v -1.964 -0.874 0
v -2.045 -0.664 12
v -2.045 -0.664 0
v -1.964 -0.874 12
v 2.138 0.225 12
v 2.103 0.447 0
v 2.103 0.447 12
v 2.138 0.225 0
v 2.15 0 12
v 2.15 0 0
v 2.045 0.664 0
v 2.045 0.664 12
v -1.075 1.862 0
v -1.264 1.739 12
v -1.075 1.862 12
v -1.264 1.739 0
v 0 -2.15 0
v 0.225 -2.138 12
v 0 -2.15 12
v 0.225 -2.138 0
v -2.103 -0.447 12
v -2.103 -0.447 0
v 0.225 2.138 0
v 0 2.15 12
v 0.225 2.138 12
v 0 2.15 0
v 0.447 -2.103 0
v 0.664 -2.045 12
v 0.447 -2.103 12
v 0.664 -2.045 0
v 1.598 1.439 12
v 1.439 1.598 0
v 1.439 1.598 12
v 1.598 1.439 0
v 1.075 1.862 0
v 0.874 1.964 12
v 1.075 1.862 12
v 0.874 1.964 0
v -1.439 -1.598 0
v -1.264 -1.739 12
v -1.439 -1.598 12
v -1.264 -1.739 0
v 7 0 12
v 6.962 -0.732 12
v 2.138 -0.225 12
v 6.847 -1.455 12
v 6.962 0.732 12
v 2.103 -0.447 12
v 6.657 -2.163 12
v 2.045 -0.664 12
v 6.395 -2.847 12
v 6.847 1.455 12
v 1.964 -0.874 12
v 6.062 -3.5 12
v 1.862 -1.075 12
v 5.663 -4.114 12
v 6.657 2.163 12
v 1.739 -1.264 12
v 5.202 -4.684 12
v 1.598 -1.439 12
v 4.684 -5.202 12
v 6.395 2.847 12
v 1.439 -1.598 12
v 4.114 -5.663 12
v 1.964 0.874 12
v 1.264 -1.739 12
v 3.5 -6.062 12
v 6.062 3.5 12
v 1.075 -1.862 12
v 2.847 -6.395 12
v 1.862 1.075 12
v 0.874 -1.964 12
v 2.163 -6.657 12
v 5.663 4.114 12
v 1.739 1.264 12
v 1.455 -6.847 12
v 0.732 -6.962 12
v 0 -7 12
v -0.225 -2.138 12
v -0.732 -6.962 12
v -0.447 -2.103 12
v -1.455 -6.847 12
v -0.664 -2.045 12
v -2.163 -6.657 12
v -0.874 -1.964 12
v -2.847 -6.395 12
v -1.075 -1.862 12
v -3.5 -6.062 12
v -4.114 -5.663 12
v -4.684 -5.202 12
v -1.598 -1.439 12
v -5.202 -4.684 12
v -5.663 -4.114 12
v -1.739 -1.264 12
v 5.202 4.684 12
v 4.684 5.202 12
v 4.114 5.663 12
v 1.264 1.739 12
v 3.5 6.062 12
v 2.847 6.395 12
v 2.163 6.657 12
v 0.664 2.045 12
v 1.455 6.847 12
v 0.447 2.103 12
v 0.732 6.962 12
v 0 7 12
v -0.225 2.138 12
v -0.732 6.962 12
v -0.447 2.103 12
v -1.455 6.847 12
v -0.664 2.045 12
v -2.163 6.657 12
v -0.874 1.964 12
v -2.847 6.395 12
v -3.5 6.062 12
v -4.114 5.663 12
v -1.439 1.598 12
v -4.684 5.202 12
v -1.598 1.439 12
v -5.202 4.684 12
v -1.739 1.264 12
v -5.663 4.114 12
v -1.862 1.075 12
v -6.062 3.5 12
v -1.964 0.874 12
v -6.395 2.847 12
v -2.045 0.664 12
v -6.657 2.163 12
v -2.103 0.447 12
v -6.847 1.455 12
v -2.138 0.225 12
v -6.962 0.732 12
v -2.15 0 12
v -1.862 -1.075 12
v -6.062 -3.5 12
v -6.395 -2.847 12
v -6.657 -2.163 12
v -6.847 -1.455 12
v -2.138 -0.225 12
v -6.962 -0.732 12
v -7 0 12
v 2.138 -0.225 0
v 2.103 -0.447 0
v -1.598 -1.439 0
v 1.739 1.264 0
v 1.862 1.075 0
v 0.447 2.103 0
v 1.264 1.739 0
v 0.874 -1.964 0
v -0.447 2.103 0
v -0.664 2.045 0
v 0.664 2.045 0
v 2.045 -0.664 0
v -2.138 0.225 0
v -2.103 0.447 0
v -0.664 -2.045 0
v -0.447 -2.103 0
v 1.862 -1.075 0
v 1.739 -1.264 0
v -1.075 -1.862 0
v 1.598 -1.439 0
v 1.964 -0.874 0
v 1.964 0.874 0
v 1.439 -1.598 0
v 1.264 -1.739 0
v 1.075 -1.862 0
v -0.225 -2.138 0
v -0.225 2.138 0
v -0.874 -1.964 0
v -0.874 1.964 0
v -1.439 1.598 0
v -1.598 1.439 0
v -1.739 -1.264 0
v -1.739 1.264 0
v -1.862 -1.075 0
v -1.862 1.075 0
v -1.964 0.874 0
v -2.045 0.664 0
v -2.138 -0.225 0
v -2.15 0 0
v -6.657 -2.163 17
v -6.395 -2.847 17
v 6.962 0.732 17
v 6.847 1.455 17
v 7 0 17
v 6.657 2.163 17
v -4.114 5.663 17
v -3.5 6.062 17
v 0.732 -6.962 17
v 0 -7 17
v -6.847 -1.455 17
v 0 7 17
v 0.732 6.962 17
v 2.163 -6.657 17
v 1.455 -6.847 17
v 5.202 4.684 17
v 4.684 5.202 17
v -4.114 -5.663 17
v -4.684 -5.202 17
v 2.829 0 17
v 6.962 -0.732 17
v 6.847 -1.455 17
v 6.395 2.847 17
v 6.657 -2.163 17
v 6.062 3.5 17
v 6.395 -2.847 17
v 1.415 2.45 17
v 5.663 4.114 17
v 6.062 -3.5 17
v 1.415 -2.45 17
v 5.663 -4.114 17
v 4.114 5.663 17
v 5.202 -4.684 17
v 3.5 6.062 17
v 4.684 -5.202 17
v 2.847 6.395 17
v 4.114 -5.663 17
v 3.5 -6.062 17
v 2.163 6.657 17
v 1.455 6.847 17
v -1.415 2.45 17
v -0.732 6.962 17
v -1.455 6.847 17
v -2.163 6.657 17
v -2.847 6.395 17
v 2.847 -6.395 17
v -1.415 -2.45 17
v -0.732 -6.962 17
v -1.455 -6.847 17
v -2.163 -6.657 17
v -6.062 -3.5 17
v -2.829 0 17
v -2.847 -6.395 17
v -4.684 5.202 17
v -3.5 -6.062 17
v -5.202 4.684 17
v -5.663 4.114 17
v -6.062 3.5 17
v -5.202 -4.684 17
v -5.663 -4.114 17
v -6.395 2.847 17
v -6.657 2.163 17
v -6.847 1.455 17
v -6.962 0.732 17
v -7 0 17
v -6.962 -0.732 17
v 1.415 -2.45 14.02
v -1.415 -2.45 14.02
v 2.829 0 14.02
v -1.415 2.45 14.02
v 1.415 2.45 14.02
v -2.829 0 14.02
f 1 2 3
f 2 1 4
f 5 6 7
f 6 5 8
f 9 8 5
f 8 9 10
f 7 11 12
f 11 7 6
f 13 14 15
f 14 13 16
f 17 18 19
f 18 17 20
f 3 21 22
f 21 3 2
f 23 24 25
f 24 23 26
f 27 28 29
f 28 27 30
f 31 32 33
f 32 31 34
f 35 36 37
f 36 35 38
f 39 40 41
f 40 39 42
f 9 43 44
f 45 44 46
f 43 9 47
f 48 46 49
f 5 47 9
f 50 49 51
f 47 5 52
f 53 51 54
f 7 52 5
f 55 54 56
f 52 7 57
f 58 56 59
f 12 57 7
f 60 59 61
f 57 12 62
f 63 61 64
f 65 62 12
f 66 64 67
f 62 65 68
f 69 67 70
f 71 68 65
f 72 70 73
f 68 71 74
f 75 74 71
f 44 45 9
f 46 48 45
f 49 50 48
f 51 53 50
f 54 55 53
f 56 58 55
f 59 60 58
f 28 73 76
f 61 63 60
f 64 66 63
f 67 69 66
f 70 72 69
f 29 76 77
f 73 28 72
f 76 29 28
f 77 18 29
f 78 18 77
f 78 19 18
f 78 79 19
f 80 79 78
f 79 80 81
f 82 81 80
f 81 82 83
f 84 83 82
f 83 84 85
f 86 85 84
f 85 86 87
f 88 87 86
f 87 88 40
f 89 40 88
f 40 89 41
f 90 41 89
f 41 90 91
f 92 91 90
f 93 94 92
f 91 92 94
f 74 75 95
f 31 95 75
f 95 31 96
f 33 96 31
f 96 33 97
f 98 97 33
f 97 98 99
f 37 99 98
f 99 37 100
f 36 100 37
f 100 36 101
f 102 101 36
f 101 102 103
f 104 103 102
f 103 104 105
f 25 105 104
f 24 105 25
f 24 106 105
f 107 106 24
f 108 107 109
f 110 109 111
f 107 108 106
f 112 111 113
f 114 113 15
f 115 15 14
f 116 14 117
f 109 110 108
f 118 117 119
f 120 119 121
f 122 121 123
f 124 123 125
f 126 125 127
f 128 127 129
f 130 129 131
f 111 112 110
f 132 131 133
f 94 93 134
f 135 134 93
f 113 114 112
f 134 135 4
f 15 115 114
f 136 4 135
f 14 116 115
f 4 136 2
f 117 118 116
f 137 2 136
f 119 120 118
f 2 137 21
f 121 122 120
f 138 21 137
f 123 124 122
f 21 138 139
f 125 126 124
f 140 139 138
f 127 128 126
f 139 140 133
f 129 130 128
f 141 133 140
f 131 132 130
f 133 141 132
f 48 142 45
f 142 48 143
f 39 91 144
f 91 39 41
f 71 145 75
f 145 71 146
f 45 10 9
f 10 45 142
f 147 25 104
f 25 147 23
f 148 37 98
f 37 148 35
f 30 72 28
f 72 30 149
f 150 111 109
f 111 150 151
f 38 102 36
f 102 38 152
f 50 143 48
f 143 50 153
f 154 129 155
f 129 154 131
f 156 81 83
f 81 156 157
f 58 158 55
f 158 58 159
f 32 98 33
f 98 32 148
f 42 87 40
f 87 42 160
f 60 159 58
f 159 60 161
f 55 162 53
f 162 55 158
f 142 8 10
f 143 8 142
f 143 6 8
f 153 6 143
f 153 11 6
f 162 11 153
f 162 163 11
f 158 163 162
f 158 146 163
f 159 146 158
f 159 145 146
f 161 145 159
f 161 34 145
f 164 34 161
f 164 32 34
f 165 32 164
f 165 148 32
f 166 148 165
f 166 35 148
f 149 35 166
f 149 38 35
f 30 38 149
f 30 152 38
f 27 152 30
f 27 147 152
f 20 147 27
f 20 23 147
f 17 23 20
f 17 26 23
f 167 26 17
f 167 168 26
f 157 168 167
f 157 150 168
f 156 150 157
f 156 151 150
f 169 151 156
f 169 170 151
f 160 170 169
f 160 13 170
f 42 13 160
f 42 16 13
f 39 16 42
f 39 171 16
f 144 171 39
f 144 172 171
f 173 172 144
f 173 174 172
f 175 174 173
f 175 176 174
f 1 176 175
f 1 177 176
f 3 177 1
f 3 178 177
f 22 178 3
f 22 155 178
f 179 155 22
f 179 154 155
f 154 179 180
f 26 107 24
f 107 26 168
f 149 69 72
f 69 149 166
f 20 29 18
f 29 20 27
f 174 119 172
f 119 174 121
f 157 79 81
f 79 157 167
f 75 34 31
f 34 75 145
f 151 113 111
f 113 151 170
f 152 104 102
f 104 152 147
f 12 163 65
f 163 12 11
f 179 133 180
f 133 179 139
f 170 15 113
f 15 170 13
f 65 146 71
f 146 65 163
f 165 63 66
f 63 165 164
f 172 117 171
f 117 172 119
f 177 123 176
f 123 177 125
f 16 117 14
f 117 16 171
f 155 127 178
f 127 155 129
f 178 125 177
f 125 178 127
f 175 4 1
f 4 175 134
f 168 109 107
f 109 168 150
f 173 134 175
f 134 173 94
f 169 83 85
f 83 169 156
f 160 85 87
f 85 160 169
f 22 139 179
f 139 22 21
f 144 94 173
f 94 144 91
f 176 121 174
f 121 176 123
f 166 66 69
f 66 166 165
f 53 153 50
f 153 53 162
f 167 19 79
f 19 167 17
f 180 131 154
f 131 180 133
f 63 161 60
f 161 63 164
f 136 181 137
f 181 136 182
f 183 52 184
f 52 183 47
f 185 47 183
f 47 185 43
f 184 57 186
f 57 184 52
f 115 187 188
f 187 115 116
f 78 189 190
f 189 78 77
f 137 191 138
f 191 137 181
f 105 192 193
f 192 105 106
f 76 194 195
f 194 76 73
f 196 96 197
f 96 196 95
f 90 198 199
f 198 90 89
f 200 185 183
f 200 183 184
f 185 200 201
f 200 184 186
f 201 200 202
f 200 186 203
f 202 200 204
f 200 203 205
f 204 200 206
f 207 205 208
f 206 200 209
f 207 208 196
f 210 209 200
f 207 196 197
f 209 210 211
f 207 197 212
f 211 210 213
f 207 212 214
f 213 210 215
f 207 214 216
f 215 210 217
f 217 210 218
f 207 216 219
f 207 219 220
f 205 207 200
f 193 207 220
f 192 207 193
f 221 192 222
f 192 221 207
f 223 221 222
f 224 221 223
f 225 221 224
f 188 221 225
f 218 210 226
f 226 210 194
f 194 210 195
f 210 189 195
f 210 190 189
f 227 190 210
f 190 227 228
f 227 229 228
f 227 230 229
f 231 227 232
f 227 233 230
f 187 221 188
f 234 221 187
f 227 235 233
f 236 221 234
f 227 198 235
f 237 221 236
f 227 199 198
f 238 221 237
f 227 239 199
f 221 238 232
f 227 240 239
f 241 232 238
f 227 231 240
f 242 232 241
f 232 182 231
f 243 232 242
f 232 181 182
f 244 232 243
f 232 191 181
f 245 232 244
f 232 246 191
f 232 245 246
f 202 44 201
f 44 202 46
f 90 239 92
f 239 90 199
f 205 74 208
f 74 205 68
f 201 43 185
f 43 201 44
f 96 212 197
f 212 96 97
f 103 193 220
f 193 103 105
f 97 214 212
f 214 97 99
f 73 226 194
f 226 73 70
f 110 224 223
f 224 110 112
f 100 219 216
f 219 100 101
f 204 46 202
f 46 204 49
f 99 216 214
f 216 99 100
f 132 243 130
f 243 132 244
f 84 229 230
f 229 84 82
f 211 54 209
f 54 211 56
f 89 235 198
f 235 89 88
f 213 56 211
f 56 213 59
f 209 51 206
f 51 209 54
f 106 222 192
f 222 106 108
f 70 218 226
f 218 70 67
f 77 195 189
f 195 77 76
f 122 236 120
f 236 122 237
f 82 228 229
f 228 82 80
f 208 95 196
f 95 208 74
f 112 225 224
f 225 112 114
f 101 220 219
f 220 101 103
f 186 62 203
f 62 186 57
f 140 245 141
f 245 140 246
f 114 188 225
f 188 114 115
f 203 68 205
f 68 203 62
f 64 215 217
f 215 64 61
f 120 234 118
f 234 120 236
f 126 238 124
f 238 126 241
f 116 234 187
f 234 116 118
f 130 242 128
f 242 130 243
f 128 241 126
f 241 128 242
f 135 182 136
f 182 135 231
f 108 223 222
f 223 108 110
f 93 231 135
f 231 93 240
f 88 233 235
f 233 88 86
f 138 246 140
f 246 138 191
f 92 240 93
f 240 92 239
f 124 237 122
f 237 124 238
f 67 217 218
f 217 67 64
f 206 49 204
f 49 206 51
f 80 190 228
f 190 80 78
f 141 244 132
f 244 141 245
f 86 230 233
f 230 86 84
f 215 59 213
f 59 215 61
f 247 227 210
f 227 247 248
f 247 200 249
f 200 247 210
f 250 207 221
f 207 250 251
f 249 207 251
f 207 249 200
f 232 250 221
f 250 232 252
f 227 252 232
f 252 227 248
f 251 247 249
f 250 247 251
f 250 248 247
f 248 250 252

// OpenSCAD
// Thumb screw, smooth-shank representation.
$fn = 60;
eps = 0.02;
shaft_d = 4.3;
head_d = 14;
shaft_l = 12;
head_h = 5;
difference() {
    union() { cylinder(d = shaft_d, h = shaft_l); translate([0, 0, shaft_l]) cylinder(d = head_d, h = head_h); }
    translate([0, 0, shaft_l + head_h - 3 + eps]) cylinder(d = head_d * 0.35 / cos(30), h = 3 + eps, $fn = 6);
}
